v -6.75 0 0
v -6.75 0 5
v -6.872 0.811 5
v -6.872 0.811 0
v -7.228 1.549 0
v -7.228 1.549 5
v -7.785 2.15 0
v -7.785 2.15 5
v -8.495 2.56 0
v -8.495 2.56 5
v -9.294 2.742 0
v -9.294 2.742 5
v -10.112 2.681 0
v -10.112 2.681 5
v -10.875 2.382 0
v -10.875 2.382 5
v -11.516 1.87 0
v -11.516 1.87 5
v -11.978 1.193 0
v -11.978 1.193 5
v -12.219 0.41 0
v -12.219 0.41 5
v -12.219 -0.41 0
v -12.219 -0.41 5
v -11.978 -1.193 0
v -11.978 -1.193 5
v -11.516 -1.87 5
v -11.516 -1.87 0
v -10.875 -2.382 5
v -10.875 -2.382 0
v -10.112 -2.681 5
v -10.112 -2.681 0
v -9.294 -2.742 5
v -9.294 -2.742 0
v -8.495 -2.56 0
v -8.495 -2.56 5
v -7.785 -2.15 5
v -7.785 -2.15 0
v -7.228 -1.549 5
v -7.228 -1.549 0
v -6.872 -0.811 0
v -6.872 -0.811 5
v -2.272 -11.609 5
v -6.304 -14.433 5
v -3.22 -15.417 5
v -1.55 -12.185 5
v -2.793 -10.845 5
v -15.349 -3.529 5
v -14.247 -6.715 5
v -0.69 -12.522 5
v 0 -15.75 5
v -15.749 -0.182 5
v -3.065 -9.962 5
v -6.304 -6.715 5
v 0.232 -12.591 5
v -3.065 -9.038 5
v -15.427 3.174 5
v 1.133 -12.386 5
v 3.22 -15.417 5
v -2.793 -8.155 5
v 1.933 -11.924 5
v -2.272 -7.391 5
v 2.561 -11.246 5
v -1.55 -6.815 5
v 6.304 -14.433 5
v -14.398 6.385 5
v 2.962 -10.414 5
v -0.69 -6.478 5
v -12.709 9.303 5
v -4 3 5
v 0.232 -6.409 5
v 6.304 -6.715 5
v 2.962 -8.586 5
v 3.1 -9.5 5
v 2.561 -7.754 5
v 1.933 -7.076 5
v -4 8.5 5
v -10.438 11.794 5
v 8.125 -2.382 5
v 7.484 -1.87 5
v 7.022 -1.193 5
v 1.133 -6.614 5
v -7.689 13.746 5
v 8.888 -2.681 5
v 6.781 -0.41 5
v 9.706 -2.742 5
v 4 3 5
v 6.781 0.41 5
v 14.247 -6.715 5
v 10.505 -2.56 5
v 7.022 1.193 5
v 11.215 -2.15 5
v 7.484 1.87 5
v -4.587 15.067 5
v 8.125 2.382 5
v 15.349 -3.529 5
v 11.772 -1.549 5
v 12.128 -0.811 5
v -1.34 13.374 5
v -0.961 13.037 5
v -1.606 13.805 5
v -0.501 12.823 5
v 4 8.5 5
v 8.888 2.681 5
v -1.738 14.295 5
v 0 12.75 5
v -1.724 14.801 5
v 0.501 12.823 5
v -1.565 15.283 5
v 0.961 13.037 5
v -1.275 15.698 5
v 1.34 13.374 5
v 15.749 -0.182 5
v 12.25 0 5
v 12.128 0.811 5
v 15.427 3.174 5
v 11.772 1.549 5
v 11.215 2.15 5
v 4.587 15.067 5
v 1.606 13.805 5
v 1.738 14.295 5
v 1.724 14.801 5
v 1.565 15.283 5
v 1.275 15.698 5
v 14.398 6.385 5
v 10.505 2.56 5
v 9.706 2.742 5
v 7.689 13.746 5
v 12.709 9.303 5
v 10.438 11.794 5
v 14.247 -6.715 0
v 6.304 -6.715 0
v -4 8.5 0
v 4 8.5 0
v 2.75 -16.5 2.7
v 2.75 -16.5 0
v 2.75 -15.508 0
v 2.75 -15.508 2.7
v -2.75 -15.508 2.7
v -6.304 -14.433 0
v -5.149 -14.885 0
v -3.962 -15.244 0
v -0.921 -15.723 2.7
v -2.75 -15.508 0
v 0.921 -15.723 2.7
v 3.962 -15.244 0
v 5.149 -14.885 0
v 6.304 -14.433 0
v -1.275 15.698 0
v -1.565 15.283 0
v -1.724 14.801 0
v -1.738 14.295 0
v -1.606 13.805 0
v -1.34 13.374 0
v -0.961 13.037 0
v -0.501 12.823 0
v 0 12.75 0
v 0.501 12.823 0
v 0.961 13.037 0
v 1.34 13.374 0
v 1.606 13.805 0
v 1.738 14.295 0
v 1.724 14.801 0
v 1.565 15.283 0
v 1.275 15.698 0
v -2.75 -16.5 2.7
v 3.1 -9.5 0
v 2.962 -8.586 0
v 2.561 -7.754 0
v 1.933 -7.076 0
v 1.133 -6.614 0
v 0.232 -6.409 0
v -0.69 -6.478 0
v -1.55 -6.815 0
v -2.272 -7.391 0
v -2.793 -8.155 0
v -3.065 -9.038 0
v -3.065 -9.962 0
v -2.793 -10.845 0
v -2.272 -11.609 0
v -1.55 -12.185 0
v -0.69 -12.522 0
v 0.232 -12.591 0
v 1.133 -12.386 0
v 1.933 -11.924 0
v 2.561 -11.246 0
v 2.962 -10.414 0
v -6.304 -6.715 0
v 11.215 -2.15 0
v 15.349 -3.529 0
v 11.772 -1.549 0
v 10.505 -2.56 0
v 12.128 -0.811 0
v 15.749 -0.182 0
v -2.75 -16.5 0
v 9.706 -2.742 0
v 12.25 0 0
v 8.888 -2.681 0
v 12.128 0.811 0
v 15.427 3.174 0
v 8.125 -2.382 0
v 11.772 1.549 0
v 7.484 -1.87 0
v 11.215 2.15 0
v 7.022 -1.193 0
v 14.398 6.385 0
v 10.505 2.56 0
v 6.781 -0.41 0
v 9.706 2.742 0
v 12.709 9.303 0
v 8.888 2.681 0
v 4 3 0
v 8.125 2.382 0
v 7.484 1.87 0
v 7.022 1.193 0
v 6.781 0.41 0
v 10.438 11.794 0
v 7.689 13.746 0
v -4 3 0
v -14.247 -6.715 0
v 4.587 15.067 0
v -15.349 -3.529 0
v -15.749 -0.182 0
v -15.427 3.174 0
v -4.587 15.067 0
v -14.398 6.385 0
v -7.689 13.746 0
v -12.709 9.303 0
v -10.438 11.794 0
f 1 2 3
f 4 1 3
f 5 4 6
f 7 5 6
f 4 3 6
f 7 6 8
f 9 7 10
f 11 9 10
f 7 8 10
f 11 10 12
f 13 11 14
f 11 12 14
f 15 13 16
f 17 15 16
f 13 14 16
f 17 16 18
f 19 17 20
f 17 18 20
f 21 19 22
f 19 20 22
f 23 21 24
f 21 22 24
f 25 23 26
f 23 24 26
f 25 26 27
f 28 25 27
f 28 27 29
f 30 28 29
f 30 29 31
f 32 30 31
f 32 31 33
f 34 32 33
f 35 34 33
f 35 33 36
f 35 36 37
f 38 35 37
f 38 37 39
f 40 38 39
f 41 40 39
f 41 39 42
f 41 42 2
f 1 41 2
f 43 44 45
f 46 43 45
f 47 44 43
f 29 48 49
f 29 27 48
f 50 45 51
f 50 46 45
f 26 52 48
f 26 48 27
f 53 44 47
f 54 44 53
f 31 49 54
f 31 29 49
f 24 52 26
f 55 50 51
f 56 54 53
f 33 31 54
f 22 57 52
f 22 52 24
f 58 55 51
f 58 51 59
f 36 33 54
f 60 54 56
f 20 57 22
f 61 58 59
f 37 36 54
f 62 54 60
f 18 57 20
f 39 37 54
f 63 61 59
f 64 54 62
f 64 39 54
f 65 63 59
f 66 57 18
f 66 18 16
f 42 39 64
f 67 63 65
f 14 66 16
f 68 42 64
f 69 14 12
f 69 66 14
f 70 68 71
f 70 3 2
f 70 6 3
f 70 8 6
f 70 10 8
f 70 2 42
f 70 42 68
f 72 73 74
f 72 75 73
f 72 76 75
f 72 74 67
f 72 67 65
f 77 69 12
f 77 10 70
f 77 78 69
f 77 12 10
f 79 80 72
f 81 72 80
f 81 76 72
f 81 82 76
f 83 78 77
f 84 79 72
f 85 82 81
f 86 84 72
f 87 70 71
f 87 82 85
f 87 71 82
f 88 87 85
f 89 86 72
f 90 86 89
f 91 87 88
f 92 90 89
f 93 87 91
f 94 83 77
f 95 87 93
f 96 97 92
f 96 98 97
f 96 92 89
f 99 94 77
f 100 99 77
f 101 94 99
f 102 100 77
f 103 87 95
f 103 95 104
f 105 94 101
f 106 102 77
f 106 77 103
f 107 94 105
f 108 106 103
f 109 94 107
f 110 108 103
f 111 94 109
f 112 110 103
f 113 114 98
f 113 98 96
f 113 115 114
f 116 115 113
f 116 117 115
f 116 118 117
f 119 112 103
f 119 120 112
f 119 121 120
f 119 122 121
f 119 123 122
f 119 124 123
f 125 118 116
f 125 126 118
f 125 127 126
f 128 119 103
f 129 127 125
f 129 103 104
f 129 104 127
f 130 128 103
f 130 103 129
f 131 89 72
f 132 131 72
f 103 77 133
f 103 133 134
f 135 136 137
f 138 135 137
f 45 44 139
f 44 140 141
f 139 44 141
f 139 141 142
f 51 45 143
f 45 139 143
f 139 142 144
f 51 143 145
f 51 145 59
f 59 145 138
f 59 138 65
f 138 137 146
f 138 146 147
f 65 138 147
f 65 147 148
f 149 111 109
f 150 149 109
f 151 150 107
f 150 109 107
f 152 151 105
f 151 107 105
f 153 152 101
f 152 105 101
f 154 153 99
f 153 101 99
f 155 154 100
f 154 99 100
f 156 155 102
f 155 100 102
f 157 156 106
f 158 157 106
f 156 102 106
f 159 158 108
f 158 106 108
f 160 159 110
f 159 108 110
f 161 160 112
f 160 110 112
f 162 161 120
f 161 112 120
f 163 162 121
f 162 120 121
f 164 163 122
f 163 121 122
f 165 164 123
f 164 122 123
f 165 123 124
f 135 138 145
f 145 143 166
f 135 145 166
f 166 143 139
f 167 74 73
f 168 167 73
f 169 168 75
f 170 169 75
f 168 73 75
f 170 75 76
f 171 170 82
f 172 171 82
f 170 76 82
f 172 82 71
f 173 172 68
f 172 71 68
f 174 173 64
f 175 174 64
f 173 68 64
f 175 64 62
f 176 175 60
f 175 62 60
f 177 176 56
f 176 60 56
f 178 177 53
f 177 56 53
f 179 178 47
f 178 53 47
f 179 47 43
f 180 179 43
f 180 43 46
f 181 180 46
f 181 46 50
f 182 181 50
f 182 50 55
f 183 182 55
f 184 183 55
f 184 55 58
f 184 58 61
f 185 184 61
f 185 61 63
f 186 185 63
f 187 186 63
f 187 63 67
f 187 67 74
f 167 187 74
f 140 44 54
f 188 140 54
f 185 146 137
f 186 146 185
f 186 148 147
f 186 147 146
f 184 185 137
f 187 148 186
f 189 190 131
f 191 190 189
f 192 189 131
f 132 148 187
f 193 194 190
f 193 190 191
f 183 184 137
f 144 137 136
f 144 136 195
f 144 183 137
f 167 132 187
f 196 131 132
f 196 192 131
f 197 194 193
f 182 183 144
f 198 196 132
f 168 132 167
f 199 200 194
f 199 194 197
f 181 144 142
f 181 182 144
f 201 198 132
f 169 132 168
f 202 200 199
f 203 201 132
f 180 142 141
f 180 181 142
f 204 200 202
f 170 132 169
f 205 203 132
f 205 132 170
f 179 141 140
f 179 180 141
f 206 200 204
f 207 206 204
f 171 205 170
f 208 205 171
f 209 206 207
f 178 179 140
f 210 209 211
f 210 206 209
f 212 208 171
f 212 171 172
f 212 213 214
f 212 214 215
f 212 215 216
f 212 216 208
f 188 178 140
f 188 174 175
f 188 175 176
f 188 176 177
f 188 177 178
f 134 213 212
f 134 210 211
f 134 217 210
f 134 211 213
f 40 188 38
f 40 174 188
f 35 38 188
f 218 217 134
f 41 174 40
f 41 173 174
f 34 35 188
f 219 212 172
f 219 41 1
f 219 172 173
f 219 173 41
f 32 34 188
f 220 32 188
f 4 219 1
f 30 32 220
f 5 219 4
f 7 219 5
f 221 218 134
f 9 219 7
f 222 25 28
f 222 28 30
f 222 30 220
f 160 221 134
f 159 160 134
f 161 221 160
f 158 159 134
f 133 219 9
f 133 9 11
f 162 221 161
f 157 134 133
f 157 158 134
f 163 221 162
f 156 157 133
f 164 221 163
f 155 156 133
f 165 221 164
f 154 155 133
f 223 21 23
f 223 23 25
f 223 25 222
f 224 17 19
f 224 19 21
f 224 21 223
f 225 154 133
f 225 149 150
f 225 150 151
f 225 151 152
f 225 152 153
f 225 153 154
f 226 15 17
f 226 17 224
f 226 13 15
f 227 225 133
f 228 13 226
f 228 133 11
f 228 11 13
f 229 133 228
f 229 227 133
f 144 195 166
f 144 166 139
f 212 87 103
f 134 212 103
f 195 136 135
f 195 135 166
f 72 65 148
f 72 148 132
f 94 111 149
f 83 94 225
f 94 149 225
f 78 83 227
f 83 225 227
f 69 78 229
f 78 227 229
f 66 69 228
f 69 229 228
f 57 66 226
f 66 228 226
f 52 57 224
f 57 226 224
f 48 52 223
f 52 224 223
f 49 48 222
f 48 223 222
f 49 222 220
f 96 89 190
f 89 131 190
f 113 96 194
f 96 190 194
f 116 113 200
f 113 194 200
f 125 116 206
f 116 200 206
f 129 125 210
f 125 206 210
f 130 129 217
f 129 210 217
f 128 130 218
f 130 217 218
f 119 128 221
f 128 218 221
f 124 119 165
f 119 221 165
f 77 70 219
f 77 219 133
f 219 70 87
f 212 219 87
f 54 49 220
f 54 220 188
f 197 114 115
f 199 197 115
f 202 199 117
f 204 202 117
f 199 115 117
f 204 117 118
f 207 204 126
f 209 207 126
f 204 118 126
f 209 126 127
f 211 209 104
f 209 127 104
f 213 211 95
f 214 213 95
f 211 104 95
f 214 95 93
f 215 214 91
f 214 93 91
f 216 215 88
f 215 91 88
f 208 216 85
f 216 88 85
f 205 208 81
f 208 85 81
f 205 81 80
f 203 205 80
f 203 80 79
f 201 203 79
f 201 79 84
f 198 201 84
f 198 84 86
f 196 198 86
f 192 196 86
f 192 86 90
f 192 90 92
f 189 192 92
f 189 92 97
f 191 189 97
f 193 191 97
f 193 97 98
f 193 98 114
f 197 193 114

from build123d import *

# Parameters (mm, degrees)
ESQUISSE1_R             = 15.75
BOSS_EXTRU_1_DEPTH      = 5
ESQUISSE2_W             = 5.5
ESQUISSE2_H             = 2.985070052
BOSS_EXTRU_2_DEPTH      = 2.7
ESQUISSE3_R             = 1.75
ESQUISSE3_R_2           = 2.75
ESQUISSE3_R_3           = 3.1
ENL_V_MAT_EXTRU_1_DEPTH = 6
ESQUISSE4_W             = 7.942495838
ESQUISSE4_H             = 7.71802451
ENL_V_MAT_EXTRU_2_DEPTH = 6
ESQUISSE5_W             = 8
ESQUISSE5_H             = 5.5
ENL_V_MAT_EXTRU_3_DEPTH = 6


with BuildPart() as part:
    # Esquisse1 → Boss.-Extru.1 (new body)
    with BuildSketch(Plane.XY):
        Circle(ESQUISSE1_R)
    extrude(amount=BOSS_EXTRU_1_DEPTH)

    # Esquisse2 → Boss.-Extru.2 (add)
    with BuildSketch(Plane(origin=(0, 0, 0), x_dir=(-1, 0, 0), z_dir=(0, 0, -1))):
        with Locations((0, -15.007464974)):
            Rectangle(ESQUISSE2_W, ESQUISSE2_H)
    extrude(amount=-BOSS_EXTRU_2_DEPTH)

    # Esquisse3 → Enlèv. mat.-Extru.1 (cut, through all)
    with BuildSketch(Plane.XY.offset(5)):
        with Locations((0, 14.5)):
            Circle(ESQUISSE3_R)
        with Locations((9.5, 0)):
            Circle(ESQUISSE3_R_2)
        with Locations((-9.5, 0)):
            Circle(ESQUISSE3_R_2)
        with Locations((0, -9.5)):
            Circle(ESQUISSE3_R_3)
    extrude(amount=-ENL_V_MAT_EXTRU_1_DEPTH, mode=Mode.SUBTRACT)

    # Esquisse4 → Enlèv. mat.-Extru.2 (cut, through all)
    with BuildSketch(Plane.XY.offset(5)):
        with Locations((-10.275426072, -10.574276969)):
            Rectangle(ESQUISSE4_W, ESQUISSE4_H)
    enl_v_mat_extru_2 = extrude(amount=-ENL_V_MAT_EXTRU_2_DEPTH, mode=Mode.SUBTRACT)

    # Symétrie1: Enlèv. mat.-Extru.2 across plane
    add(enl_v_mat_extru_2.mirror(Plane(origin=(0, 0, 0), x_dir=(0, 0, 1), z_dir=(1, 0, 0))), mode=Mode.SUBTRACT)

    # Esquisse5 → Enlèv. mat.-Extru.3 (cut, through all)
    with BuildSketch(Plane.XY.offset(5)):
        with Locations((0, 5.75)):
            Rectangle(ESQUISSE5_W, ESQUISSE5_H)
    extrude(amount=-ENL_V_MAT_EXTRU_3_DEPTH, mode=Mode.SUBTRACT)


solid = part.part
